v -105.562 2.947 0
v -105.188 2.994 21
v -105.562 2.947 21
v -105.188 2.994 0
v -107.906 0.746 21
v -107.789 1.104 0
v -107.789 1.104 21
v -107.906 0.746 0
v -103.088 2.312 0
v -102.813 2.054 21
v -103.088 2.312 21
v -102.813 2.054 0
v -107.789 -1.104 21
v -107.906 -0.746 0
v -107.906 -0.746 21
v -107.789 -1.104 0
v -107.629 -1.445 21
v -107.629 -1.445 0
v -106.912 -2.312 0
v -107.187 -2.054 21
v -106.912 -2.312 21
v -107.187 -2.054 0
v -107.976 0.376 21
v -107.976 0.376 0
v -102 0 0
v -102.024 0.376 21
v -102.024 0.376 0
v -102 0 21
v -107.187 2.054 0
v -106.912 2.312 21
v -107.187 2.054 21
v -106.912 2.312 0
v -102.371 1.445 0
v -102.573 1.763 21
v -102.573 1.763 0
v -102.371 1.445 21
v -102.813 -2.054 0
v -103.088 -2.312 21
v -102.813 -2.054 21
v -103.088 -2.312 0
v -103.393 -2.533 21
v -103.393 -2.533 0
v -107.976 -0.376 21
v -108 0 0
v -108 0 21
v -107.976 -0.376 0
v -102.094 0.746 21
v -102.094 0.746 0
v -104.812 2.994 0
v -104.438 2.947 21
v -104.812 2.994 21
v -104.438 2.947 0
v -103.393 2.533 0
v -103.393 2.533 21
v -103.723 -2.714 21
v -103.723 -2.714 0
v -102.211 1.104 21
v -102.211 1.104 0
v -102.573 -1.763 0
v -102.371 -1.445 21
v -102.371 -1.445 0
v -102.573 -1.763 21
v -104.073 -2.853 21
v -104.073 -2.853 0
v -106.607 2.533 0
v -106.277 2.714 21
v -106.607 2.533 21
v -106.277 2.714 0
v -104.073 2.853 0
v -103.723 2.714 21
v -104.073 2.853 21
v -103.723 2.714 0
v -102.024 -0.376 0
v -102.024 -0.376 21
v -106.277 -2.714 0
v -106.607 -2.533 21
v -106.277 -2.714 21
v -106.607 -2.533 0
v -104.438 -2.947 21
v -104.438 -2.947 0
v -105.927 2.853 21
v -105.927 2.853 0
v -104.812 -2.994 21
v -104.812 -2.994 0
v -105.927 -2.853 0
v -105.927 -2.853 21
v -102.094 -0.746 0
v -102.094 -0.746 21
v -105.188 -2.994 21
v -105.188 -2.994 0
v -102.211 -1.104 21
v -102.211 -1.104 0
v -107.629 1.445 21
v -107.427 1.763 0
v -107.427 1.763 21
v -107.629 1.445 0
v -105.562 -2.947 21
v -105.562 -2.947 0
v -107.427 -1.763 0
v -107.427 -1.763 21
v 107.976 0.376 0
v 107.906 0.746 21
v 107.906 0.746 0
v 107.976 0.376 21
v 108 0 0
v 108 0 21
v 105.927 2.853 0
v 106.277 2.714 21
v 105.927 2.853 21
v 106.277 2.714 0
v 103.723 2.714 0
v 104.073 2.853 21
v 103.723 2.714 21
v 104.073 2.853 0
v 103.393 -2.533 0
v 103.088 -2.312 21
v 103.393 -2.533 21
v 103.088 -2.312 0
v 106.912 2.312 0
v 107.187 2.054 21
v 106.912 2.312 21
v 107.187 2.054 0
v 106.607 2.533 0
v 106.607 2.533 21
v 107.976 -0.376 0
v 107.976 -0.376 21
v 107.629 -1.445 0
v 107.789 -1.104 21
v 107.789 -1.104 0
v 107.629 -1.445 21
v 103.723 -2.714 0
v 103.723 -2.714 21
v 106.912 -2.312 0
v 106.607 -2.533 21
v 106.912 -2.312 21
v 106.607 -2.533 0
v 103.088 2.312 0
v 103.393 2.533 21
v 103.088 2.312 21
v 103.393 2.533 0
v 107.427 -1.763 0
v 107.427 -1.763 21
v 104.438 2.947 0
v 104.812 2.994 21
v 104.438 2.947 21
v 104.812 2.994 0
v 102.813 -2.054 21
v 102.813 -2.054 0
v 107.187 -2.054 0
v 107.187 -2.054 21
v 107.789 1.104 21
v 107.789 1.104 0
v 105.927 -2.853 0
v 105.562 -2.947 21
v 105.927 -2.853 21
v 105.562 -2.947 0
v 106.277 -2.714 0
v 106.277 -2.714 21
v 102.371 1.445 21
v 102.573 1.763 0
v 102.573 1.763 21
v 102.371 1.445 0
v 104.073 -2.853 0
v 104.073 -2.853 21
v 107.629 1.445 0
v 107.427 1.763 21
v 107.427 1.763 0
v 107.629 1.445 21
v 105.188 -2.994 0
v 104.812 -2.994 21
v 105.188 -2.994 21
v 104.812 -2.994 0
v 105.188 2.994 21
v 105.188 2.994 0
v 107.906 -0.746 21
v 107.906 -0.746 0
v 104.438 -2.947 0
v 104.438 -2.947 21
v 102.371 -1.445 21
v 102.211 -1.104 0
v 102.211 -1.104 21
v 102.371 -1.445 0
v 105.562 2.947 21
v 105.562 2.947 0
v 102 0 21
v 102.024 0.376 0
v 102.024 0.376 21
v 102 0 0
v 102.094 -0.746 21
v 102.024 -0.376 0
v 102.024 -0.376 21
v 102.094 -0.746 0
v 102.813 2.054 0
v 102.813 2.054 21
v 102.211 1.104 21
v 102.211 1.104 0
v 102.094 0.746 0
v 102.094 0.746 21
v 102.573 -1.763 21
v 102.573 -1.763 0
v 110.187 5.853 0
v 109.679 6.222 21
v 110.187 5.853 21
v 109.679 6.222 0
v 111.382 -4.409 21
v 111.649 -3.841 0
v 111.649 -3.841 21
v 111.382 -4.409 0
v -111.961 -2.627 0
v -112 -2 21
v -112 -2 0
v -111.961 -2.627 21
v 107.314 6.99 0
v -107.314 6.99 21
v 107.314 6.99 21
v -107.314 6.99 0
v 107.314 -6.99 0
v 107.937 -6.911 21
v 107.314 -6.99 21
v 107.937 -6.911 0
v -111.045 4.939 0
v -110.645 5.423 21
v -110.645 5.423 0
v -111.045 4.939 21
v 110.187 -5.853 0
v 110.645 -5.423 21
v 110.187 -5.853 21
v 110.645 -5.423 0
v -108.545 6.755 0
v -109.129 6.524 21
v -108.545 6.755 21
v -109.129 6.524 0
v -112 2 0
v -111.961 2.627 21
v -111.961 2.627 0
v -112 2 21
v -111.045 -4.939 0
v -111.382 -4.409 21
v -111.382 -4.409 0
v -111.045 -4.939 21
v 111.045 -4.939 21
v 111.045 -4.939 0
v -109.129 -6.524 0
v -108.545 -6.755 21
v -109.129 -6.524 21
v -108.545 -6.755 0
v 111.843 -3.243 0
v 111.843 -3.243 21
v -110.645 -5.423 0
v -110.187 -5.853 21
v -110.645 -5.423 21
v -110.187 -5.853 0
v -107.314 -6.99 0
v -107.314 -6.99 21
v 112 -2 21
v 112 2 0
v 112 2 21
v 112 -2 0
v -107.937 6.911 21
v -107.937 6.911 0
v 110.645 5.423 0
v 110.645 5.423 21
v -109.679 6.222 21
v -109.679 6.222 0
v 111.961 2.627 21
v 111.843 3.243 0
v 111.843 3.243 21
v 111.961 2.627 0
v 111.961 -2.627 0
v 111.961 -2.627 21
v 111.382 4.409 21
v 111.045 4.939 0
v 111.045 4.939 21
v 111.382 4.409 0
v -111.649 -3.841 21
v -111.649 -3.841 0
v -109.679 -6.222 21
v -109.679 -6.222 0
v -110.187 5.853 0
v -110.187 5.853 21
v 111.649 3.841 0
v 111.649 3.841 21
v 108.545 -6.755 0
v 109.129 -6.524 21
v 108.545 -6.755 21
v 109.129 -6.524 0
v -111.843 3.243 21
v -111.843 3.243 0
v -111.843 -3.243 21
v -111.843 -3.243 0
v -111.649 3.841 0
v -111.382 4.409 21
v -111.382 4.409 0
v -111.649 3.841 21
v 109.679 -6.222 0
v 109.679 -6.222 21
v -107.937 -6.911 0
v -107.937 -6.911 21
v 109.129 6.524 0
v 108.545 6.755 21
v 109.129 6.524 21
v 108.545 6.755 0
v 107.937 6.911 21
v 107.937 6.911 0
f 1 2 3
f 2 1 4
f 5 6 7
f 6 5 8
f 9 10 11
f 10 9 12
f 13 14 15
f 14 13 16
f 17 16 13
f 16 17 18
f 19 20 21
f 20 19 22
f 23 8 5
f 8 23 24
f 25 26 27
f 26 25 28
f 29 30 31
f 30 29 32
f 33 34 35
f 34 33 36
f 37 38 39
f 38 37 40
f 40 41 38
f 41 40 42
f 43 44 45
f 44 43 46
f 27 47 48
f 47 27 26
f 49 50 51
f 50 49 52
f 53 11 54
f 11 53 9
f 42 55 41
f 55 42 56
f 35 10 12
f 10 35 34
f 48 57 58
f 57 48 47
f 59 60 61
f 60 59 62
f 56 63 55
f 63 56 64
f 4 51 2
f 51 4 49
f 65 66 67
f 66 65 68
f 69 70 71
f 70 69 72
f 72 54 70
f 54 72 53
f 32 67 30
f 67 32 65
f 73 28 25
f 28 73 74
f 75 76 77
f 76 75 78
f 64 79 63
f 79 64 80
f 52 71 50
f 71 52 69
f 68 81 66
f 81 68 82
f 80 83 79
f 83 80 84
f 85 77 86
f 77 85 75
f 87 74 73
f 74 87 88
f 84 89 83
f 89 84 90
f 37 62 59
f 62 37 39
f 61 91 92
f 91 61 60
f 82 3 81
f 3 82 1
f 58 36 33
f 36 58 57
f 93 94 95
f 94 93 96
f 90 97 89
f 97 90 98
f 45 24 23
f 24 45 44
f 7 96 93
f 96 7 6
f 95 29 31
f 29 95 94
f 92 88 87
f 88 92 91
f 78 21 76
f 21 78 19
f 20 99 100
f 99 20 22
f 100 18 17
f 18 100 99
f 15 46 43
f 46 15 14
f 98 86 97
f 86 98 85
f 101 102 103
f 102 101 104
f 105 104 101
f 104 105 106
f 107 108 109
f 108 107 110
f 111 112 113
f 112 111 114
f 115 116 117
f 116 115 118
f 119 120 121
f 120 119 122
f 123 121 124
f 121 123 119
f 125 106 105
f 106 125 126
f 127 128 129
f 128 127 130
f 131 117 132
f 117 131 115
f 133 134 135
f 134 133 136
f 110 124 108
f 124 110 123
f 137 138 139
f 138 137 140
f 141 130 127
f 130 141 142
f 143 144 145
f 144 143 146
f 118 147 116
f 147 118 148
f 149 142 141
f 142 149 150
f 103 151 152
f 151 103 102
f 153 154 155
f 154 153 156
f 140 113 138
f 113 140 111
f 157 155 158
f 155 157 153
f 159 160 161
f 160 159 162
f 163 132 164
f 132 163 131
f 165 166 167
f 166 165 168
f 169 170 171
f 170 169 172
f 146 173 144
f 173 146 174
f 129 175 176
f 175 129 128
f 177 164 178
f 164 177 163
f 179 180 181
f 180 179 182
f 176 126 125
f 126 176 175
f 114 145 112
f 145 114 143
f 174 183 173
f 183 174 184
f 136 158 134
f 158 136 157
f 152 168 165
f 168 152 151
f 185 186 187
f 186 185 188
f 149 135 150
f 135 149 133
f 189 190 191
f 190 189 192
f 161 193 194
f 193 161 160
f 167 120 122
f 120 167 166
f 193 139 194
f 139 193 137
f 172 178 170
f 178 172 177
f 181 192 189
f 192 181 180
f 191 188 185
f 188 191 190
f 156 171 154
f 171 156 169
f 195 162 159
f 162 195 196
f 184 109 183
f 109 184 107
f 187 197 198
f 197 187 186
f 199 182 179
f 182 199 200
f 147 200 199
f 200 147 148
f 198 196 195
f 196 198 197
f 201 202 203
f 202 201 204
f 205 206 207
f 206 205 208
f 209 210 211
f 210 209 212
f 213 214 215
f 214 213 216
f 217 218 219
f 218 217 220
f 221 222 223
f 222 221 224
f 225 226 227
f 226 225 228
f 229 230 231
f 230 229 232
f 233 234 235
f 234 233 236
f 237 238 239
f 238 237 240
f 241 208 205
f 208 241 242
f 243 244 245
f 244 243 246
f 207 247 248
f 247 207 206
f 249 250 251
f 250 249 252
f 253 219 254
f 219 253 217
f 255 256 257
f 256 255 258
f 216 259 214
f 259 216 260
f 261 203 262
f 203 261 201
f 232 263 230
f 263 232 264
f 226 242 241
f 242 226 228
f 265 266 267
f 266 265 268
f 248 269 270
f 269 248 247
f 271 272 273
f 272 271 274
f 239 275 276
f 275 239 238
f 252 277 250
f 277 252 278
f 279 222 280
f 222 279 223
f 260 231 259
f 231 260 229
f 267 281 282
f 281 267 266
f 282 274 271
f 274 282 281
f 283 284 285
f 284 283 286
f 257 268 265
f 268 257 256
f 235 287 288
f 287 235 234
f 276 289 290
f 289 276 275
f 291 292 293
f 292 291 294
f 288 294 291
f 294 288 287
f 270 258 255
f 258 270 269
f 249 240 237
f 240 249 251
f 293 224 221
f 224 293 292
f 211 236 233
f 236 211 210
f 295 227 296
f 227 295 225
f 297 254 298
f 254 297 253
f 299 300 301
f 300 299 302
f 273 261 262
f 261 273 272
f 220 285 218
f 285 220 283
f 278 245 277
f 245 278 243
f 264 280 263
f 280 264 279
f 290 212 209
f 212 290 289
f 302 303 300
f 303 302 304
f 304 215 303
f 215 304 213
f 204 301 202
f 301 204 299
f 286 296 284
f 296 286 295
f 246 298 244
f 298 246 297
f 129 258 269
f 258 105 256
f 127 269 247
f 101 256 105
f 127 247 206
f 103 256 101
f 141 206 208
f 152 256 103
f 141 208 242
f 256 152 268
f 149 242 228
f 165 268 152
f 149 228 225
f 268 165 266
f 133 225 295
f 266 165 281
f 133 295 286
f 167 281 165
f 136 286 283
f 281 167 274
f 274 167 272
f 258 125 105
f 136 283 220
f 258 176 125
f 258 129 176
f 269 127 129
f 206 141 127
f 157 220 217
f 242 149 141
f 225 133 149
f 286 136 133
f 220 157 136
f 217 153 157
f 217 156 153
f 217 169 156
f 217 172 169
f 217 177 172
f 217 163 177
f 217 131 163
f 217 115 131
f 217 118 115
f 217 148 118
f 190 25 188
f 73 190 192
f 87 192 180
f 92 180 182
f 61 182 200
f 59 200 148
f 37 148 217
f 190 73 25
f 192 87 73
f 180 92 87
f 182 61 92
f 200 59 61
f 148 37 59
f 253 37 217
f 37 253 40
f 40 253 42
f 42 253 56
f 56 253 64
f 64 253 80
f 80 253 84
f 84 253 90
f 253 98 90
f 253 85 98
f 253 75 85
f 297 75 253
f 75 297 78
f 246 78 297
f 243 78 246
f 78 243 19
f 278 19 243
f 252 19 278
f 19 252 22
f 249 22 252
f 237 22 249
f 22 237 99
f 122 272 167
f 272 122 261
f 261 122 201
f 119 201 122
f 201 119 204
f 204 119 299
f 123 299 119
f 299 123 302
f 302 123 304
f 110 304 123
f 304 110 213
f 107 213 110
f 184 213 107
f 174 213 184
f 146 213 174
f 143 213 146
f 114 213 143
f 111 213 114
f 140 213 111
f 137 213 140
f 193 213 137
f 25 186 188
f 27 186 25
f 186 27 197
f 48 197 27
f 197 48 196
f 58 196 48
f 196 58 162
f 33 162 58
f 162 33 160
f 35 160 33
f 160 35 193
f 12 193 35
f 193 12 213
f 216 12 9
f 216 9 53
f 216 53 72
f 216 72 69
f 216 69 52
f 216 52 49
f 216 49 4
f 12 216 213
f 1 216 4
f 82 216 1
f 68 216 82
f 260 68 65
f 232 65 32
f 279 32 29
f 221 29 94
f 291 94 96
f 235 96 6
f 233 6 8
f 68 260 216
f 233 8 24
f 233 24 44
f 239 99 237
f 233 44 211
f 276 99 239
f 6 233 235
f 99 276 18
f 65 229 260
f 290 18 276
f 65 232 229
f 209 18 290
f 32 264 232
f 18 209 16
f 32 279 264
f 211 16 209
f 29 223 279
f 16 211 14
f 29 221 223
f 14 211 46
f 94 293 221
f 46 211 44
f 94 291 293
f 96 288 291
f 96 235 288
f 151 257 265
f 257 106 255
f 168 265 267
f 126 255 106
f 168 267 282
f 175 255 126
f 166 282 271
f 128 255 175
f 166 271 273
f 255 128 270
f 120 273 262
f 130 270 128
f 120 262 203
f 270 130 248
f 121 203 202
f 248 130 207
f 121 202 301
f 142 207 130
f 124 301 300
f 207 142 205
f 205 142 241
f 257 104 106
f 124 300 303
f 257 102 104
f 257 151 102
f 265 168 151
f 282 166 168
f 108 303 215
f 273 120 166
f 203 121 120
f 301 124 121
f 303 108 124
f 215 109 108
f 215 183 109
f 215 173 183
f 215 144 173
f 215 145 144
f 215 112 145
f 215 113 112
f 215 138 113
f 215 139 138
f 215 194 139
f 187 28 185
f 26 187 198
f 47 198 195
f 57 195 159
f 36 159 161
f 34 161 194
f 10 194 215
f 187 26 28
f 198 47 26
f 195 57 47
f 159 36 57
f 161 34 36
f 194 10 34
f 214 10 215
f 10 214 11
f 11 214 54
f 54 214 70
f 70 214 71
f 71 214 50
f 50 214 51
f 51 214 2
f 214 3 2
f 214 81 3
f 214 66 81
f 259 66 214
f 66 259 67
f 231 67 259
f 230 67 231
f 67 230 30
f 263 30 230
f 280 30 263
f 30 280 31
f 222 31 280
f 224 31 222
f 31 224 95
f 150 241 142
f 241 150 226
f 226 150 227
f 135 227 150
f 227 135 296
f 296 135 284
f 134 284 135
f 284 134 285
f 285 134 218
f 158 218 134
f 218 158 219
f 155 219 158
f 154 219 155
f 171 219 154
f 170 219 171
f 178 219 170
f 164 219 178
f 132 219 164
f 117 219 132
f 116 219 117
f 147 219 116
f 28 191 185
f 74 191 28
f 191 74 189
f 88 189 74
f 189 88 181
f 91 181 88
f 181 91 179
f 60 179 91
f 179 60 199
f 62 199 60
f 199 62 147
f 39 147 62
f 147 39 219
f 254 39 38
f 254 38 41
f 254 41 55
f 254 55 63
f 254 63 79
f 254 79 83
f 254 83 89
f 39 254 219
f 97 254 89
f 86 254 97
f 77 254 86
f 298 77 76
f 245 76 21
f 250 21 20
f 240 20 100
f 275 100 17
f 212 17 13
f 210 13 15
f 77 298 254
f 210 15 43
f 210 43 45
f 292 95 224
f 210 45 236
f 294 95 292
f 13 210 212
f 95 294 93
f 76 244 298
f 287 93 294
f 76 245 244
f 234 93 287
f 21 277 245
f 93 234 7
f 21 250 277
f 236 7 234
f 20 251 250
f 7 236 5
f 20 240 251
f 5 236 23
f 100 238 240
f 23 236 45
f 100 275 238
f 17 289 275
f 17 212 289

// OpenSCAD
$fn = 50;


difference() {
	union() {
		hull() {
			translate(v = [-107.0000000000, 2.0000000000, 0]) {
				cylinder(h = 21, r = 5);
			}
			translate(v = [107.0000000000, 2.0000000000, 0]) {
				cylinder(h = 21, r = 5);
			}
			translate(v = [-107.0000000000, -2.0000000000, 0]) {
				cylinder(h = 21, r = 5);
			}
			translate(v = [107.0000000000, -2.0000000000, 0]) {
				cylinder(h = 21, r = 5);
			}
		}
	}
	union() {
		translate(v = [-105.0000000000, 0.0000000000, -100.0000000000]) {
			cylinder(h = 200, r = 3.0000000000);
		}
		translate(v = [-105.0000000000, 0.0000000000, -100.0000000000]) {
			cylinder(h = 200, r = 3.0000000000);
		}
		translate(v = [105.0000000000, 0.0000000000, -100.0000000000]) {
			cylinder(h = 200, r = 3.0000000000);
		}
		translate(v = [105.0000000000, 0.0000000000, -100.0000000000]) {
			cylinder(h = 200, r = 3.0000000000);
		}
	}
}
